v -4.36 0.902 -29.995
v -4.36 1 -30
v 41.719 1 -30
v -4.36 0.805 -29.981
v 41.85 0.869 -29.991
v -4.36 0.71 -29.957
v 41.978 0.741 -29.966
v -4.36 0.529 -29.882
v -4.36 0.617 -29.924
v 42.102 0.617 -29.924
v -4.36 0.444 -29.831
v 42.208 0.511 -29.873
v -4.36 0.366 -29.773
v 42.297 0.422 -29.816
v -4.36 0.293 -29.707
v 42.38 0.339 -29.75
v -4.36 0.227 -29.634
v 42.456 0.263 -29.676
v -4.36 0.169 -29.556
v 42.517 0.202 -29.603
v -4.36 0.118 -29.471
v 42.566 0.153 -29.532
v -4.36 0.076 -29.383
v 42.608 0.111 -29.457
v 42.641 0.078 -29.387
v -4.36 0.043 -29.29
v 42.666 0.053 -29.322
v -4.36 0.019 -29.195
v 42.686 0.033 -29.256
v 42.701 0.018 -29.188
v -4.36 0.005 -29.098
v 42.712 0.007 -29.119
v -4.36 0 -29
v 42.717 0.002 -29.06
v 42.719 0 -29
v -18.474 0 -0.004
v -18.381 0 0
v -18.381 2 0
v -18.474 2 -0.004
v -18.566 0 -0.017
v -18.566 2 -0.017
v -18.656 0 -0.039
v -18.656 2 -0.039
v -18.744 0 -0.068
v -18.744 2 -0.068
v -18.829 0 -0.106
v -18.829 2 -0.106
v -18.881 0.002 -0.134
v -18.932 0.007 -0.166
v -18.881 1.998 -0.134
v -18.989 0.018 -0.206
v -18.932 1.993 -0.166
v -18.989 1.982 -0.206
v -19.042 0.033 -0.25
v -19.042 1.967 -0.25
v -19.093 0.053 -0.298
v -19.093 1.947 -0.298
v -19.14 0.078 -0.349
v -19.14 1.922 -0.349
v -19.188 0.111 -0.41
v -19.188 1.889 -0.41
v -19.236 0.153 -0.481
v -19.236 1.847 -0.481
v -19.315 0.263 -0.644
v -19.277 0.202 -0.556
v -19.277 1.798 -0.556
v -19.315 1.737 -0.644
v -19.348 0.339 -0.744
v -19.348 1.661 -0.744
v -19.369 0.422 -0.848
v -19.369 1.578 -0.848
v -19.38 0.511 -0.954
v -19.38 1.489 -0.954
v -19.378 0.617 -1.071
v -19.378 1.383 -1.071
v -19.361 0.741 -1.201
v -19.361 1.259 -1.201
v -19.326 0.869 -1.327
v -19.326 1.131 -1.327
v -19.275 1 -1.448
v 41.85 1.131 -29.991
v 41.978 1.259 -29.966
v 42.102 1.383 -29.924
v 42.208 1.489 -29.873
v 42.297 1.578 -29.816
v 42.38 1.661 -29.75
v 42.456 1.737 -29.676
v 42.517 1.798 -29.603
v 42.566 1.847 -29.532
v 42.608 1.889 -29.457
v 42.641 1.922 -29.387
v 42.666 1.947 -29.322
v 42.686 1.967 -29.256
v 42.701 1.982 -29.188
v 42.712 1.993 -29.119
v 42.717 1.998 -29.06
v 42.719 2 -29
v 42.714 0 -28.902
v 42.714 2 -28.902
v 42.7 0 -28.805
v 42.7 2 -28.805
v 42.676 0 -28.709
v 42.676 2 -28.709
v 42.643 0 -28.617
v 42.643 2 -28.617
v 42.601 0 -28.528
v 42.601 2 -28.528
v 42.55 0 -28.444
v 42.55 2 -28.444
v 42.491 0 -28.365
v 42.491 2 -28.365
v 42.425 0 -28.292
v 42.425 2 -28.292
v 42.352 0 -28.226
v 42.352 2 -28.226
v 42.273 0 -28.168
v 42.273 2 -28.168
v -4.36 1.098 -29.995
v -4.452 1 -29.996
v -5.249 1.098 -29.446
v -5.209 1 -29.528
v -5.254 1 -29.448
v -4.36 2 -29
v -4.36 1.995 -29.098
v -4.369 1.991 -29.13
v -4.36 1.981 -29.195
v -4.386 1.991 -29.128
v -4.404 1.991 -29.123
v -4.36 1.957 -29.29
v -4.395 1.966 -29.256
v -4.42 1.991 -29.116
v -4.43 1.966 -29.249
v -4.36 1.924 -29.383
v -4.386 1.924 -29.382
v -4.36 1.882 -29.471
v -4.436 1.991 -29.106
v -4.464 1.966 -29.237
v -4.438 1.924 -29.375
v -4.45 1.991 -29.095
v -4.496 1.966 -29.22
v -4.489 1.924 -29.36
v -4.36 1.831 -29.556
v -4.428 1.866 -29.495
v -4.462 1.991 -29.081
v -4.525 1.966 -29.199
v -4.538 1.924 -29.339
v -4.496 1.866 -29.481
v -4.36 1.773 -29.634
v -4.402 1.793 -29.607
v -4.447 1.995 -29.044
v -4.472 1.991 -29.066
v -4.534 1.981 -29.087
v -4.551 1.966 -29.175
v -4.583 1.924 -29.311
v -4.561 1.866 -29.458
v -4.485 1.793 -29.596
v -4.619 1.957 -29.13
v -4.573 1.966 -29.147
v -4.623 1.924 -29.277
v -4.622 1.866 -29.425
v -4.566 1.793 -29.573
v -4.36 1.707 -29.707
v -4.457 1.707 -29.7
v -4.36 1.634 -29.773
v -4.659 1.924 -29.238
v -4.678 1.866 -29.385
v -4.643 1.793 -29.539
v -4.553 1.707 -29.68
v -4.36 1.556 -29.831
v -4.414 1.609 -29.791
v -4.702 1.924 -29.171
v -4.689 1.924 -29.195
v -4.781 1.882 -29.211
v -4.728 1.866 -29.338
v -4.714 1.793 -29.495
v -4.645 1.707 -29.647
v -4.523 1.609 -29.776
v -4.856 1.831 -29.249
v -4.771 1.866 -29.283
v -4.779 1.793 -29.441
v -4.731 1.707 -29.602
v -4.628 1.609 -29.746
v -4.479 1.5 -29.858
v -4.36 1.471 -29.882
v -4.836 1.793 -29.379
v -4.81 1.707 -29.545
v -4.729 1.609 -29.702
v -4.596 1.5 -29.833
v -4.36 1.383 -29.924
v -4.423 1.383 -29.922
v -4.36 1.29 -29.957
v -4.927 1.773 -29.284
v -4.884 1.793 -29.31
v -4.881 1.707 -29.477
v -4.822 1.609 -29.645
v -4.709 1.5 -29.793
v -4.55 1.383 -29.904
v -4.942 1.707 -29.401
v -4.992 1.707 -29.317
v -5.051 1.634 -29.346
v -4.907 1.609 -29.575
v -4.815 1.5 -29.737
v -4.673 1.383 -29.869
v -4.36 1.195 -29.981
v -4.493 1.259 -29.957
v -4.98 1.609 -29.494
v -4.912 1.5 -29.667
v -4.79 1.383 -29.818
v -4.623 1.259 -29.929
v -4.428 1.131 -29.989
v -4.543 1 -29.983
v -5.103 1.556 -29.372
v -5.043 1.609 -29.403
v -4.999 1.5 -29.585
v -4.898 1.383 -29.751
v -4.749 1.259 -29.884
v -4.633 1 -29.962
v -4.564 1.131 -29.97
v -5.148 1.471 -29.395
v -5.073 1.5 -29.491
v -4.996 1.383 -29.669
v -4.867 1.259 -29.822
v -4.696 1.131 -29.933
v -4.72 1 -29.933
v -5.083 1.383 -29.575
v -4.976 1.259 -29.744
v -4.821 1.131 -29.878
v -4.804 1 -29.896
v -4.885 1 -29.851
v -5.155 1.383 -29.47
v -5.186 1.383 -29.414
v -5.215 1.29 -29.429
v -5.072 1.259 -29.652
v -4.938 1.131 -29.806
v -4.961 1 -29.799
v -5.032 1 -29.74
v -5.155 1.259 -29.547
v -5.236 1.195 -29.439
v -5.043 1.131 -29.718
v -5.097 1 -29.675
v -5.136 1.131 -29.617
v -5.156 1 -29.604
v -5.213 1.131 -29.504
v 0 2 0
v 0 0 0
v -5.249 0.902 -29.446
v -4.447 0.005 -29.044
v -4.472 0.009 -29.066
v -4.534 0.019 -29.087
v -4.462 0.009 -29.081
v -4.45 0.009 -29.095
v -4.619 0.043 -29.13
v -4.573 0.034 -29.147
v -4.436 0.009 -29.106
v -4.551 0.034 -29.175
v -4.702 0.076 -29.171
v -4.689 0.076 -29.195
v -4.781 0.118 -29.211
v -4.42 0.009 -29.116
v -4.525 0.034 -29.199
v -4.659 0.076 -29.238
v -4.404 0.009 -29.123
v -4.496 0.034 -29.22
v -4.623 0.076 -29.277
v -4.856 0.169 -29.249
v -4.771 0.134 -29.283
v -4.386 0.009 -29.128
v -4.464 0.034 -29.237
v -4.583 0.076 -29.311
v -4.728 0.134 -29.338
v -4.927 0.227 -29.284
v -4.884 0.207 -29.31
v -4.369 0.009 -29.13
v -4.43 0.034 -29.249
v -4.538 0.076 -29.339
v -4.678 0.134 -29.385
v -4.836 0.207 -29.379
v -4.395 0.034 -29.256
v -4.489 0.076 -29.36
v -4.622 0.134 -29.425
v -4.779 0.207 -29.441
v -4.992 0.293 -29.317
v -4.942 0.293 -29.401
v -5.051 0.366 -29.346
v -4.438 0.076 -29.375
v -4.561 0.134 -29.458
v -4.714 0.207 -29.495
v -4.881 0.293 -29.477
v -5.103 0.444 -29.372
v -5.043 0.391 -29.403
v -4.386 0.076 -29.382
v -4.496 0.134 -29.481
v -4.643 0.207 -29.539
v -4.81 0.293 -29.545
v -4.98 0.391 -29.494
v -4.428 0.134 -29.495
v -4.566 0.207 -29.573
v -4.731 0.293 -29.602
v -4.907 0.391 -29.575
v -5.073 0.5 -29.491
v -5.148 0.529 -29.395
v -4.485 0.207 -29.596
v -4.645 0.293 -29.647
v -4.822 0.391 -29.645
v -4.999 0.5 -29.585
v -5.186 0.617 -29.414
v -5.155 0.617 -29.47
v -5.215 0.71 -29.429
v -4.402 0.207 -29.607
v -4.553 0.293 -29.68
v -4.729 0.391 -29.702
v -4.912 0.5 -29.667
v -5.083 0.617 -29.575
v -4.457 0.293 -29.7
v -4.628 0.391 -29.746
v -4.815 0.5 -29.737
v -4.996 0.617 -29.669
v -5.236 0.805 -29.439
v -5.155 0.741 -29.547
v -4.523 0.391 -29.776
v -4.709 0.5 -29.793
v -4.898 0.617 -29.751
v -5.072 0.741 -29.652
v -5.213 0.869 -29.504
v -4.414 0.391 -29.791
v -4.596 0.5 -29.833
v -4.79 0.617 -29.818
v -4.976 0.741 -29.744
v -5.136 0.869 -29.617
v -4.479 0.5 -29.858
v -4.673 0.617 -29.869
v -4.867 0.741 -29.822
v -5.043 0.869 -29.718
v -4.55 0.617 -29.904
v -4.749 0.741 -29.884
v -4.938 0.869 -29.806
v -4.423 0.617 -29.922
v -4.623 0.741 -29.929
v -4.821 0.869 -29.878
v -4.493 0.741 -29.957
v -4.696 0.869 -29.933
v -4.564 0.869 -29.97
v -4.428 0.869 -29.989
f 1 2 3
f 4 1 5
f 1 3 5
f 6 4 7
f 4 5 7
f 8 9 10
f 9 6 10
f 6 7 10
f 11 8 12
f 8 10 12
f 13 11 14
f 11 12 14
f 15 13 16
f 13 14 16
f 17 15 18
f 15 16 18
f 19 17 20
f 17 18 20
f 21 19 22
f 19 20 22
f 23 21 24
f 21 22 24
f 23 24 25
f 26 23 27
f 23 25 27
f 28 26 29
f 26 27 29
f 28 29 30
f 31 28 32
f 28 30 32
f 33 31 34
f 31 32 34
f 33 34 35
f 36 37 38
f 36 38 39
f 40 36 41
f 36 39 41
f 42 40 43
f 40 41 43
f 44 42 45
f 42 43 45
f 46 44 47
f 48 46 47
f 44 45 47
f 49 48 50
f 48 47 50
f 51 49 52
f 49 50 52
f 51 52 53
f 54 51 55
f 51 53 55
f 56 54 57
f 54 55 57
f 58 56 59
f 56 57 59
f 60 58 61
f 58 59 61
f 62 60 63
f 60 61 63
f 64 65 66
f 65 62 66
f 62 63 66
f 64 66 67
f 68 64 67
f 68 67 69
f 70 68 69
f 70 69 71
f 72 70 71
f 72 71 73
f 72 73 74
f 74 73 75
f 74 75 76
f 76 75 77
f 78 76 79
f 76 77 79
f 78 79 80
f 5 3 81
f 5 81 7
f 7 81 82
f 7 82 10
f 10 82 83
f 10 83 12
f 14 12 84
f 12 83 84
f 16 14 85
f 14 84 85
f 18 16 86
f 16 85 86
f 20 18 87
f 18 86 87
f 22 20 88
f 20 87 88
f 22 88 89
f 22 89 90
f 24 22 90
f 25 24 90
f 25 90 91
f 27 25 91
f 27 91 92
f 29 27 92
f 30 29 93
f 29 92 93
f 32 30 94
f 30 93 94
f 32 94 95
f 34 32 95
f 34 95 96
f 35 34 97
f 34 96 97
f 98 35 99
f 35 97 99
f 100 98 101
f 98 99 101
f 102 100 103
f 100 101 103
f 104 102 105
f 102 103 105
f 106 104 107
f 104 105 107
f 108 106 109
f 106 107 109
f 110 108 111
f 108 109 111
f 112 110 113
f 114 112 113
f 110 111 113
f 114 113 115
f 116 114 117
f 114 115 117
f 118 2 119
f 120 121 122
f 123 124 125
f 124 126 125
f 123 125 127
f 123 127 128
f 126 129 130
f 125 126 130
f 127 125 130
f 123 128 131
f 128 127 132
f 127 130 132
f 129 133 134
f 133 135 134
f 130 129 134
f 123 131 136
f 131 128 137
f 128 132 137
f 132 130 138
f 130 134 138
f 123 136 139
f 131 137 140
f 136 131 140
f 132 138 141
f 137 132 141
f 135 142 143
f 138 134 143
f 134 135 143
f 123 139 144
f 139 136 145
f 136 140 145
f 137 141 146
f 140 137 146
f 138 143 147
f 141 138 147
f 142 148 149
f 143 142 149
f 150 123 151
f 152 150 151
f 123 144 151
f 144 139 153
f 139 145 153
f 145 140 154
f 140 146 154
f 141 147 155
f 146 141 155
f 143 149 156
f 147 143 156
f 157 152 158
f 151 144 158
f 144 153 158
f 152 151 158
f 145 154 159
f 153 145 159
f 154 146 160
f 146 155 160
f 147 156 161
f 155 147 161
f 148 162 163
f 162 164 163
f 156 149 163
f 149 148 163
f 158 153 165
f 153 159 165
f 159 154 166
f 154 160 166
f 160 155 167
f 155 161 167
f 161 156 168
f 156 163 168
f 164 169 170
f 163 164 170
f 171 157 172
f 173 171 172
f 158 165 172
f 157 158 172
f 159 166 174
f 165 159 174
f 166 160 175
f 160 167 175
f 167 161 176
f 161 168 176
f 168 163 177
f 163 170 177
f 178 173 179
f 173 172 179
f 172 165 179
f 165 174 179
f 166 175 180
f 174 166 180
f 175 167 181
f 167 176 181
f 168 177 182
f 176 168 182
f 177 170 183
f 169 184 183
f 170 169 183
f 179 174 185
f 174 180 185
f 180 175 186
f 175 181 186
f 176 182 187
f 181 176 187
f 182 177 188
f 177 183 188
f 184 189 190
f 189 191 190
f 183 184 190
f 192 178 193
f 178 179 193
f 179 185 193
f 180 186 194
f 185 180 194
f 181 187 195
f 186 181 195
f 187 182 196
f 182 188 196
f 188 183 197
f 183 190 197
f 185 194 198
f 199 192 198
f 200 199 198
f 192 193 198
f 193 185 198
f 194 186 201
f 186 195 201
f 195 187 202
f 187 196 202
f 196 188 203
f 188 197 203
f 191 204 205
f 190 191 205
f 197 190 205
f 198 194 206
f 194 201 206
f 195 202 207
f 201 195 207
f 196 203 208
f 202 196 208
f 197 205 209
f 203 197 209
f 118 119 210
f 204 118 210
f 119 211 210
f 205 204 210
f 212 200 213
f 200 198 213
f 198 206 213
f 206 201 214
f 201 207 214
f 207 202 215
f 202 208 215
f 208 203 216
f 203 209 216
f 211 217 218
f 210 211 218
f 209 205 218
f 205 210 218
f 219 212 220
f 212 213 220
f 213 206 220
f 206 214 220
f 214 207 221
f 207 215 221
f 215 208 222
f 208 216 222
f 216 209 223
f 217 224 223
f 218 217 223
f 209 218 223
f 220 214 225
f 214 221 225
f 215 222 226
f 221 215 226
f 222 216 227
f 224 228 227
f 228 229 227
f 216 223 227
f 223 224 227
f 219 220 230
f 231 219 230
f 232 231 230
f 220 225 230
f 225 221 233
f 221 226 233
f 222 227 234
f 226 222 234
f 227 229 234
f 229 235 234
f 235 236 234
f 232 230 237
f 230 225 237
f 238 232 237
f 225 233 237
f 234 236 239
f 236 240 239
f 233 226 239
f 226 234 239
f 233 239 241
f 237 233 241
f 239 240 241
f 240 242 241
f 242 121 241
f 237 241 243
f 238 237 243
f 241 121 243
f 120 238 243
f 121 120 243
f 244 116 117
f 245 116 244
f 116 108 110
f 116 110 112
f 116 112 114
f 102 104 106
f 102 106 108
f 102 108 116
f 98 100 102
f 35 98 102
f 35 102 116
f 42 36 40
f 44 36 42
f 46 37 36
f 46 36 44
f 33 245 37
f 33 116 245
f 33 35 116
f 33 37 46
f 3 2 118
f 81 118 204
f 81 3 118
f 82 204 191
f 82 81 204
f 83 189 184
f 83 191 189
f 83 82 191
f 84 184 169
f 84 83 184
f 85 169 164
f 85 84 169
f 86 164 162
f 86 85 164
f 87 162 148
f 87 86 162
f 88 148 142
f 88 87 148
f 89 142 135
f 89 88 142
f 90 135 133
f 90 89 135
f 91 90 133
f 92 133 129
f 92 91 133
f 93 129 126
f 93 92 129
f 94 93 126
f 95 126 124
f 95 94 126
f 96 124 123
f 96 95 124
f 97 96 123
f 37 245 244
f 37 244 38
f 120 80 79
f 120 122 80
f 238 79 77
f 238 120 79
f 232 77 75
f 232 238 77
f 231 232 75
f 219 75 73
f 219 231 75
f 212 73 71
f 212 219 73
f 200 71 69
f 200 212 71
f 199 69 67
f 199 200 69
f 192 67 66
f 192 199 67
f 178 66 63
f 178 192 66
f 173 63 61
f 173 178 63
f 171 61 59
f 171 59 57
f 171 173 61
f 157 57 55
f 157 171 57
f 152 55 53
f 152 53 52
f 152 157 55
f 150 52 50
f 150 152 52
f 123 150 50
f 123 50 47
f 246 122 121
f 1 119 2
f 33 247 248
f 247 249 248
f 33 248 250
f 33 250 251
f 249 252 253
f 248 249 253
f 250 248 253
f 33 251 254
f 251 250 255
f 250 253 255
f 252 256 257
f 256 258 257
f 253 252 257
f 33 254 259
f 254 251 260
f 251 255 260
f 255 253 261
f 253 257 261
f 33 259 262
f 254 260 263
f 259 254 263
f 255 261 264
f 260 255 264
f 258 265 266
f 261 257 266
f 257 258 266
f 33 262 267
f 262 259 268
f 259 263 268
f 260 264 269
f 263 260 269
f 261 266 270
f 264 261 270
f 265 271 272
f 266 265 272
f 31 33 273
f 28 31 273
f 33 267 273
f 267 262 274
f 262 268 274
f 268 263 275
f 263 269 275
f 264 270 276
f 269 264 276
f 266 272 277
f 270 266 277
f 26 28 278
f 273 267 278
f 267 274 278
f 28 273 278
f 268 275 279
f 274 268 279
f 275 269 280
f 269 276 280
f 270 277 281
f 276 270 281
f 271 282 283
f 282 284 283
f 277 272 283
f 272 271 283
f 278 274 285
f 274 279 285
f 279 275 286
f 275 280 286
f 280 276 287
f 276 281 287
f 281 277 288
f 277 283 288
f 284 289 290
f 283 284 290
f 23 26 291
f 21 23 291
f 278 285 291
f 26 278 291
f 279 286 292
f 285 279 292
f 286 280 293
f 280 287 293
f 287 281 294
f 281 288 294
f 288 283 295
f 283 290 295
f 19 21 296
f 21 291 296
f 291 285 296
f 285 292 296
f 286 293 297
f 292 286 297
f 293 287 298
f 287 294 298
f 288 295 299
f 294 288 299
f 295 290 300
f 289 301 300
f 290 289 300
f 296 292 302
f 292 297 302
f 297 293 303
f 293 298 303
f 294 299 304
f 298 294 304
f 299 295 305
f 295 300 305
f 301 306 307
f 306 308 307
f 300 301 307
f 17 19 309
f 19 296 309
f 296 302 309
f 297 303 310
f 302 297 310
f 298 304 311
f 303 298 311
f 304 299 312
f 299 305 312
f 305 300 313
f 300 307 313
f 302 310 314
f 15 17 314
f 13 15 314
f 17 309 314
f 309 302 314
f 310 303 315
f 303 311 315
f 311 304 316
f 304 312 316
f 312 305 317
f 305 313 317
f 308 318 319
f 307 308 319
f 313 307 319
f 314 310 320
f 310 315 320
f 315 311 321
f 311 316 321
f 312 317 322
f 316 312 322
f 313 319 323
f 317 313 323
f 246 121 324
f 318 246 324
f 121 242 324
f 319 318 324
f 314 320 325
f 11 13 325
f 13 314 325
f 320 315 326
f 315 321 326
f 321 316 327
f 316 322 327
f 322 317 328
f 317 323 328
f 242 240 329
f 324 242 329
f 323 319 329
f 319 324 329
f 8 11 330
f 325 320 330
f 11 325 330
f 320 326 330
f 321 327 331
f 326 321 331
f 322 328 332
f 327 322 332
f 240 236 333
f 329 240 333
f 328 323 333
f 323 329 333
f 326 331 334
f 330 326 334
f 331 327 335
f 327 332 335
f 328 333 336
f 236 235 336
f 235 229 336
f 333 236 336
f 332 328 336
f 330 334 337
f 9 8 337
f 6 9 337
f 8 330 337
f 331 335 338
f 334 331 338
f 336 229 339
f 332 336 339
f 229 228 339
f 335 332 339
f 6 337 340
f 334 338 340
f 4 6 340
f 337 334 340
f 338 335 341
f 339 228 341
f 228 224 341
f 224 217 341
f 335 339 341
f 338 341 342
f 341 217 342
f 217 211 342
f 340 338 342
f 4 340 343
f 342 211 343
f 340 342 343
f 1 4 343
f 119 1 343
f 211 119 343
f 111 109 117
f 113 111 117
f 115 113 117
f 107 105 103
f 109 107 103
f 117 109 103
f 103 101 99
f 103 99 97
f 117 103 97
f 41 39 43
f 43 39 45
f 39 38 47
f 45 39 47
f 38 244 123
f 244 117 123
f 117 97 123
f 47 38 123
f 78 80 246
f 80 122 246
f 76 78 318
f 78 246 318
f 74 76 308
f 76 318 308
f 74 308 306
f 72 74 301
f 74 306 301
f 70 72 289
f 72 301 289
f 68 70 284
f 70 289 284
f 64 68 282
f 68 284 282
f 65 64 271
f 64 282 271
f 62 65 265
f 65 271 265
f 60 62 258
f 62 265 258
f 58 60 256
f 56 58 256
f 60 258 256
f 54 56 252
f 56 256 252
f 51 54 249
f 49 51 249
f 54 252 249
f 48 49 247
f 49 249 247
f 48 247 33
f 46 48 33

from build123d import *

# Parameters (mm, degrees)
BOSS_EXTRUDE1_DEPTH = 2
FILLET2_R           = 1


with BuildPart() as part:
    # Sketch1 → Boss-Extrude1 (new body)
    with BuildSketch(Plane(origin=(0, 0, 0), x_dir=(1, 0, 0), z_dir=(0, 1, 0))):
        Polygon((0, 0), (-20, 0), (-4.977119068, 30), (45.022880932, 30), align=None)
    extrude(amount=BOSS_EXTRUDE1_DEPTH)

    # Fillet2
    fillet2_edges = [part.edges().sort_by_distance(p)[0] for p in [
        (-12.488559534, 2, -15),
        (-12.488559534, 0, -15),
        (20.022880932, 0, -30),
        (-20, 1, 0),
        (-4.977119068, 1, -30),
        (45.022880932, 1, -30),
        (20.022880932, 2, -30),
    ]]
    fillet(fillet2_edges, radius=FILLET2_R - 0.0001)  # a hair under: the kernel refuses the full size


solid = part.part
